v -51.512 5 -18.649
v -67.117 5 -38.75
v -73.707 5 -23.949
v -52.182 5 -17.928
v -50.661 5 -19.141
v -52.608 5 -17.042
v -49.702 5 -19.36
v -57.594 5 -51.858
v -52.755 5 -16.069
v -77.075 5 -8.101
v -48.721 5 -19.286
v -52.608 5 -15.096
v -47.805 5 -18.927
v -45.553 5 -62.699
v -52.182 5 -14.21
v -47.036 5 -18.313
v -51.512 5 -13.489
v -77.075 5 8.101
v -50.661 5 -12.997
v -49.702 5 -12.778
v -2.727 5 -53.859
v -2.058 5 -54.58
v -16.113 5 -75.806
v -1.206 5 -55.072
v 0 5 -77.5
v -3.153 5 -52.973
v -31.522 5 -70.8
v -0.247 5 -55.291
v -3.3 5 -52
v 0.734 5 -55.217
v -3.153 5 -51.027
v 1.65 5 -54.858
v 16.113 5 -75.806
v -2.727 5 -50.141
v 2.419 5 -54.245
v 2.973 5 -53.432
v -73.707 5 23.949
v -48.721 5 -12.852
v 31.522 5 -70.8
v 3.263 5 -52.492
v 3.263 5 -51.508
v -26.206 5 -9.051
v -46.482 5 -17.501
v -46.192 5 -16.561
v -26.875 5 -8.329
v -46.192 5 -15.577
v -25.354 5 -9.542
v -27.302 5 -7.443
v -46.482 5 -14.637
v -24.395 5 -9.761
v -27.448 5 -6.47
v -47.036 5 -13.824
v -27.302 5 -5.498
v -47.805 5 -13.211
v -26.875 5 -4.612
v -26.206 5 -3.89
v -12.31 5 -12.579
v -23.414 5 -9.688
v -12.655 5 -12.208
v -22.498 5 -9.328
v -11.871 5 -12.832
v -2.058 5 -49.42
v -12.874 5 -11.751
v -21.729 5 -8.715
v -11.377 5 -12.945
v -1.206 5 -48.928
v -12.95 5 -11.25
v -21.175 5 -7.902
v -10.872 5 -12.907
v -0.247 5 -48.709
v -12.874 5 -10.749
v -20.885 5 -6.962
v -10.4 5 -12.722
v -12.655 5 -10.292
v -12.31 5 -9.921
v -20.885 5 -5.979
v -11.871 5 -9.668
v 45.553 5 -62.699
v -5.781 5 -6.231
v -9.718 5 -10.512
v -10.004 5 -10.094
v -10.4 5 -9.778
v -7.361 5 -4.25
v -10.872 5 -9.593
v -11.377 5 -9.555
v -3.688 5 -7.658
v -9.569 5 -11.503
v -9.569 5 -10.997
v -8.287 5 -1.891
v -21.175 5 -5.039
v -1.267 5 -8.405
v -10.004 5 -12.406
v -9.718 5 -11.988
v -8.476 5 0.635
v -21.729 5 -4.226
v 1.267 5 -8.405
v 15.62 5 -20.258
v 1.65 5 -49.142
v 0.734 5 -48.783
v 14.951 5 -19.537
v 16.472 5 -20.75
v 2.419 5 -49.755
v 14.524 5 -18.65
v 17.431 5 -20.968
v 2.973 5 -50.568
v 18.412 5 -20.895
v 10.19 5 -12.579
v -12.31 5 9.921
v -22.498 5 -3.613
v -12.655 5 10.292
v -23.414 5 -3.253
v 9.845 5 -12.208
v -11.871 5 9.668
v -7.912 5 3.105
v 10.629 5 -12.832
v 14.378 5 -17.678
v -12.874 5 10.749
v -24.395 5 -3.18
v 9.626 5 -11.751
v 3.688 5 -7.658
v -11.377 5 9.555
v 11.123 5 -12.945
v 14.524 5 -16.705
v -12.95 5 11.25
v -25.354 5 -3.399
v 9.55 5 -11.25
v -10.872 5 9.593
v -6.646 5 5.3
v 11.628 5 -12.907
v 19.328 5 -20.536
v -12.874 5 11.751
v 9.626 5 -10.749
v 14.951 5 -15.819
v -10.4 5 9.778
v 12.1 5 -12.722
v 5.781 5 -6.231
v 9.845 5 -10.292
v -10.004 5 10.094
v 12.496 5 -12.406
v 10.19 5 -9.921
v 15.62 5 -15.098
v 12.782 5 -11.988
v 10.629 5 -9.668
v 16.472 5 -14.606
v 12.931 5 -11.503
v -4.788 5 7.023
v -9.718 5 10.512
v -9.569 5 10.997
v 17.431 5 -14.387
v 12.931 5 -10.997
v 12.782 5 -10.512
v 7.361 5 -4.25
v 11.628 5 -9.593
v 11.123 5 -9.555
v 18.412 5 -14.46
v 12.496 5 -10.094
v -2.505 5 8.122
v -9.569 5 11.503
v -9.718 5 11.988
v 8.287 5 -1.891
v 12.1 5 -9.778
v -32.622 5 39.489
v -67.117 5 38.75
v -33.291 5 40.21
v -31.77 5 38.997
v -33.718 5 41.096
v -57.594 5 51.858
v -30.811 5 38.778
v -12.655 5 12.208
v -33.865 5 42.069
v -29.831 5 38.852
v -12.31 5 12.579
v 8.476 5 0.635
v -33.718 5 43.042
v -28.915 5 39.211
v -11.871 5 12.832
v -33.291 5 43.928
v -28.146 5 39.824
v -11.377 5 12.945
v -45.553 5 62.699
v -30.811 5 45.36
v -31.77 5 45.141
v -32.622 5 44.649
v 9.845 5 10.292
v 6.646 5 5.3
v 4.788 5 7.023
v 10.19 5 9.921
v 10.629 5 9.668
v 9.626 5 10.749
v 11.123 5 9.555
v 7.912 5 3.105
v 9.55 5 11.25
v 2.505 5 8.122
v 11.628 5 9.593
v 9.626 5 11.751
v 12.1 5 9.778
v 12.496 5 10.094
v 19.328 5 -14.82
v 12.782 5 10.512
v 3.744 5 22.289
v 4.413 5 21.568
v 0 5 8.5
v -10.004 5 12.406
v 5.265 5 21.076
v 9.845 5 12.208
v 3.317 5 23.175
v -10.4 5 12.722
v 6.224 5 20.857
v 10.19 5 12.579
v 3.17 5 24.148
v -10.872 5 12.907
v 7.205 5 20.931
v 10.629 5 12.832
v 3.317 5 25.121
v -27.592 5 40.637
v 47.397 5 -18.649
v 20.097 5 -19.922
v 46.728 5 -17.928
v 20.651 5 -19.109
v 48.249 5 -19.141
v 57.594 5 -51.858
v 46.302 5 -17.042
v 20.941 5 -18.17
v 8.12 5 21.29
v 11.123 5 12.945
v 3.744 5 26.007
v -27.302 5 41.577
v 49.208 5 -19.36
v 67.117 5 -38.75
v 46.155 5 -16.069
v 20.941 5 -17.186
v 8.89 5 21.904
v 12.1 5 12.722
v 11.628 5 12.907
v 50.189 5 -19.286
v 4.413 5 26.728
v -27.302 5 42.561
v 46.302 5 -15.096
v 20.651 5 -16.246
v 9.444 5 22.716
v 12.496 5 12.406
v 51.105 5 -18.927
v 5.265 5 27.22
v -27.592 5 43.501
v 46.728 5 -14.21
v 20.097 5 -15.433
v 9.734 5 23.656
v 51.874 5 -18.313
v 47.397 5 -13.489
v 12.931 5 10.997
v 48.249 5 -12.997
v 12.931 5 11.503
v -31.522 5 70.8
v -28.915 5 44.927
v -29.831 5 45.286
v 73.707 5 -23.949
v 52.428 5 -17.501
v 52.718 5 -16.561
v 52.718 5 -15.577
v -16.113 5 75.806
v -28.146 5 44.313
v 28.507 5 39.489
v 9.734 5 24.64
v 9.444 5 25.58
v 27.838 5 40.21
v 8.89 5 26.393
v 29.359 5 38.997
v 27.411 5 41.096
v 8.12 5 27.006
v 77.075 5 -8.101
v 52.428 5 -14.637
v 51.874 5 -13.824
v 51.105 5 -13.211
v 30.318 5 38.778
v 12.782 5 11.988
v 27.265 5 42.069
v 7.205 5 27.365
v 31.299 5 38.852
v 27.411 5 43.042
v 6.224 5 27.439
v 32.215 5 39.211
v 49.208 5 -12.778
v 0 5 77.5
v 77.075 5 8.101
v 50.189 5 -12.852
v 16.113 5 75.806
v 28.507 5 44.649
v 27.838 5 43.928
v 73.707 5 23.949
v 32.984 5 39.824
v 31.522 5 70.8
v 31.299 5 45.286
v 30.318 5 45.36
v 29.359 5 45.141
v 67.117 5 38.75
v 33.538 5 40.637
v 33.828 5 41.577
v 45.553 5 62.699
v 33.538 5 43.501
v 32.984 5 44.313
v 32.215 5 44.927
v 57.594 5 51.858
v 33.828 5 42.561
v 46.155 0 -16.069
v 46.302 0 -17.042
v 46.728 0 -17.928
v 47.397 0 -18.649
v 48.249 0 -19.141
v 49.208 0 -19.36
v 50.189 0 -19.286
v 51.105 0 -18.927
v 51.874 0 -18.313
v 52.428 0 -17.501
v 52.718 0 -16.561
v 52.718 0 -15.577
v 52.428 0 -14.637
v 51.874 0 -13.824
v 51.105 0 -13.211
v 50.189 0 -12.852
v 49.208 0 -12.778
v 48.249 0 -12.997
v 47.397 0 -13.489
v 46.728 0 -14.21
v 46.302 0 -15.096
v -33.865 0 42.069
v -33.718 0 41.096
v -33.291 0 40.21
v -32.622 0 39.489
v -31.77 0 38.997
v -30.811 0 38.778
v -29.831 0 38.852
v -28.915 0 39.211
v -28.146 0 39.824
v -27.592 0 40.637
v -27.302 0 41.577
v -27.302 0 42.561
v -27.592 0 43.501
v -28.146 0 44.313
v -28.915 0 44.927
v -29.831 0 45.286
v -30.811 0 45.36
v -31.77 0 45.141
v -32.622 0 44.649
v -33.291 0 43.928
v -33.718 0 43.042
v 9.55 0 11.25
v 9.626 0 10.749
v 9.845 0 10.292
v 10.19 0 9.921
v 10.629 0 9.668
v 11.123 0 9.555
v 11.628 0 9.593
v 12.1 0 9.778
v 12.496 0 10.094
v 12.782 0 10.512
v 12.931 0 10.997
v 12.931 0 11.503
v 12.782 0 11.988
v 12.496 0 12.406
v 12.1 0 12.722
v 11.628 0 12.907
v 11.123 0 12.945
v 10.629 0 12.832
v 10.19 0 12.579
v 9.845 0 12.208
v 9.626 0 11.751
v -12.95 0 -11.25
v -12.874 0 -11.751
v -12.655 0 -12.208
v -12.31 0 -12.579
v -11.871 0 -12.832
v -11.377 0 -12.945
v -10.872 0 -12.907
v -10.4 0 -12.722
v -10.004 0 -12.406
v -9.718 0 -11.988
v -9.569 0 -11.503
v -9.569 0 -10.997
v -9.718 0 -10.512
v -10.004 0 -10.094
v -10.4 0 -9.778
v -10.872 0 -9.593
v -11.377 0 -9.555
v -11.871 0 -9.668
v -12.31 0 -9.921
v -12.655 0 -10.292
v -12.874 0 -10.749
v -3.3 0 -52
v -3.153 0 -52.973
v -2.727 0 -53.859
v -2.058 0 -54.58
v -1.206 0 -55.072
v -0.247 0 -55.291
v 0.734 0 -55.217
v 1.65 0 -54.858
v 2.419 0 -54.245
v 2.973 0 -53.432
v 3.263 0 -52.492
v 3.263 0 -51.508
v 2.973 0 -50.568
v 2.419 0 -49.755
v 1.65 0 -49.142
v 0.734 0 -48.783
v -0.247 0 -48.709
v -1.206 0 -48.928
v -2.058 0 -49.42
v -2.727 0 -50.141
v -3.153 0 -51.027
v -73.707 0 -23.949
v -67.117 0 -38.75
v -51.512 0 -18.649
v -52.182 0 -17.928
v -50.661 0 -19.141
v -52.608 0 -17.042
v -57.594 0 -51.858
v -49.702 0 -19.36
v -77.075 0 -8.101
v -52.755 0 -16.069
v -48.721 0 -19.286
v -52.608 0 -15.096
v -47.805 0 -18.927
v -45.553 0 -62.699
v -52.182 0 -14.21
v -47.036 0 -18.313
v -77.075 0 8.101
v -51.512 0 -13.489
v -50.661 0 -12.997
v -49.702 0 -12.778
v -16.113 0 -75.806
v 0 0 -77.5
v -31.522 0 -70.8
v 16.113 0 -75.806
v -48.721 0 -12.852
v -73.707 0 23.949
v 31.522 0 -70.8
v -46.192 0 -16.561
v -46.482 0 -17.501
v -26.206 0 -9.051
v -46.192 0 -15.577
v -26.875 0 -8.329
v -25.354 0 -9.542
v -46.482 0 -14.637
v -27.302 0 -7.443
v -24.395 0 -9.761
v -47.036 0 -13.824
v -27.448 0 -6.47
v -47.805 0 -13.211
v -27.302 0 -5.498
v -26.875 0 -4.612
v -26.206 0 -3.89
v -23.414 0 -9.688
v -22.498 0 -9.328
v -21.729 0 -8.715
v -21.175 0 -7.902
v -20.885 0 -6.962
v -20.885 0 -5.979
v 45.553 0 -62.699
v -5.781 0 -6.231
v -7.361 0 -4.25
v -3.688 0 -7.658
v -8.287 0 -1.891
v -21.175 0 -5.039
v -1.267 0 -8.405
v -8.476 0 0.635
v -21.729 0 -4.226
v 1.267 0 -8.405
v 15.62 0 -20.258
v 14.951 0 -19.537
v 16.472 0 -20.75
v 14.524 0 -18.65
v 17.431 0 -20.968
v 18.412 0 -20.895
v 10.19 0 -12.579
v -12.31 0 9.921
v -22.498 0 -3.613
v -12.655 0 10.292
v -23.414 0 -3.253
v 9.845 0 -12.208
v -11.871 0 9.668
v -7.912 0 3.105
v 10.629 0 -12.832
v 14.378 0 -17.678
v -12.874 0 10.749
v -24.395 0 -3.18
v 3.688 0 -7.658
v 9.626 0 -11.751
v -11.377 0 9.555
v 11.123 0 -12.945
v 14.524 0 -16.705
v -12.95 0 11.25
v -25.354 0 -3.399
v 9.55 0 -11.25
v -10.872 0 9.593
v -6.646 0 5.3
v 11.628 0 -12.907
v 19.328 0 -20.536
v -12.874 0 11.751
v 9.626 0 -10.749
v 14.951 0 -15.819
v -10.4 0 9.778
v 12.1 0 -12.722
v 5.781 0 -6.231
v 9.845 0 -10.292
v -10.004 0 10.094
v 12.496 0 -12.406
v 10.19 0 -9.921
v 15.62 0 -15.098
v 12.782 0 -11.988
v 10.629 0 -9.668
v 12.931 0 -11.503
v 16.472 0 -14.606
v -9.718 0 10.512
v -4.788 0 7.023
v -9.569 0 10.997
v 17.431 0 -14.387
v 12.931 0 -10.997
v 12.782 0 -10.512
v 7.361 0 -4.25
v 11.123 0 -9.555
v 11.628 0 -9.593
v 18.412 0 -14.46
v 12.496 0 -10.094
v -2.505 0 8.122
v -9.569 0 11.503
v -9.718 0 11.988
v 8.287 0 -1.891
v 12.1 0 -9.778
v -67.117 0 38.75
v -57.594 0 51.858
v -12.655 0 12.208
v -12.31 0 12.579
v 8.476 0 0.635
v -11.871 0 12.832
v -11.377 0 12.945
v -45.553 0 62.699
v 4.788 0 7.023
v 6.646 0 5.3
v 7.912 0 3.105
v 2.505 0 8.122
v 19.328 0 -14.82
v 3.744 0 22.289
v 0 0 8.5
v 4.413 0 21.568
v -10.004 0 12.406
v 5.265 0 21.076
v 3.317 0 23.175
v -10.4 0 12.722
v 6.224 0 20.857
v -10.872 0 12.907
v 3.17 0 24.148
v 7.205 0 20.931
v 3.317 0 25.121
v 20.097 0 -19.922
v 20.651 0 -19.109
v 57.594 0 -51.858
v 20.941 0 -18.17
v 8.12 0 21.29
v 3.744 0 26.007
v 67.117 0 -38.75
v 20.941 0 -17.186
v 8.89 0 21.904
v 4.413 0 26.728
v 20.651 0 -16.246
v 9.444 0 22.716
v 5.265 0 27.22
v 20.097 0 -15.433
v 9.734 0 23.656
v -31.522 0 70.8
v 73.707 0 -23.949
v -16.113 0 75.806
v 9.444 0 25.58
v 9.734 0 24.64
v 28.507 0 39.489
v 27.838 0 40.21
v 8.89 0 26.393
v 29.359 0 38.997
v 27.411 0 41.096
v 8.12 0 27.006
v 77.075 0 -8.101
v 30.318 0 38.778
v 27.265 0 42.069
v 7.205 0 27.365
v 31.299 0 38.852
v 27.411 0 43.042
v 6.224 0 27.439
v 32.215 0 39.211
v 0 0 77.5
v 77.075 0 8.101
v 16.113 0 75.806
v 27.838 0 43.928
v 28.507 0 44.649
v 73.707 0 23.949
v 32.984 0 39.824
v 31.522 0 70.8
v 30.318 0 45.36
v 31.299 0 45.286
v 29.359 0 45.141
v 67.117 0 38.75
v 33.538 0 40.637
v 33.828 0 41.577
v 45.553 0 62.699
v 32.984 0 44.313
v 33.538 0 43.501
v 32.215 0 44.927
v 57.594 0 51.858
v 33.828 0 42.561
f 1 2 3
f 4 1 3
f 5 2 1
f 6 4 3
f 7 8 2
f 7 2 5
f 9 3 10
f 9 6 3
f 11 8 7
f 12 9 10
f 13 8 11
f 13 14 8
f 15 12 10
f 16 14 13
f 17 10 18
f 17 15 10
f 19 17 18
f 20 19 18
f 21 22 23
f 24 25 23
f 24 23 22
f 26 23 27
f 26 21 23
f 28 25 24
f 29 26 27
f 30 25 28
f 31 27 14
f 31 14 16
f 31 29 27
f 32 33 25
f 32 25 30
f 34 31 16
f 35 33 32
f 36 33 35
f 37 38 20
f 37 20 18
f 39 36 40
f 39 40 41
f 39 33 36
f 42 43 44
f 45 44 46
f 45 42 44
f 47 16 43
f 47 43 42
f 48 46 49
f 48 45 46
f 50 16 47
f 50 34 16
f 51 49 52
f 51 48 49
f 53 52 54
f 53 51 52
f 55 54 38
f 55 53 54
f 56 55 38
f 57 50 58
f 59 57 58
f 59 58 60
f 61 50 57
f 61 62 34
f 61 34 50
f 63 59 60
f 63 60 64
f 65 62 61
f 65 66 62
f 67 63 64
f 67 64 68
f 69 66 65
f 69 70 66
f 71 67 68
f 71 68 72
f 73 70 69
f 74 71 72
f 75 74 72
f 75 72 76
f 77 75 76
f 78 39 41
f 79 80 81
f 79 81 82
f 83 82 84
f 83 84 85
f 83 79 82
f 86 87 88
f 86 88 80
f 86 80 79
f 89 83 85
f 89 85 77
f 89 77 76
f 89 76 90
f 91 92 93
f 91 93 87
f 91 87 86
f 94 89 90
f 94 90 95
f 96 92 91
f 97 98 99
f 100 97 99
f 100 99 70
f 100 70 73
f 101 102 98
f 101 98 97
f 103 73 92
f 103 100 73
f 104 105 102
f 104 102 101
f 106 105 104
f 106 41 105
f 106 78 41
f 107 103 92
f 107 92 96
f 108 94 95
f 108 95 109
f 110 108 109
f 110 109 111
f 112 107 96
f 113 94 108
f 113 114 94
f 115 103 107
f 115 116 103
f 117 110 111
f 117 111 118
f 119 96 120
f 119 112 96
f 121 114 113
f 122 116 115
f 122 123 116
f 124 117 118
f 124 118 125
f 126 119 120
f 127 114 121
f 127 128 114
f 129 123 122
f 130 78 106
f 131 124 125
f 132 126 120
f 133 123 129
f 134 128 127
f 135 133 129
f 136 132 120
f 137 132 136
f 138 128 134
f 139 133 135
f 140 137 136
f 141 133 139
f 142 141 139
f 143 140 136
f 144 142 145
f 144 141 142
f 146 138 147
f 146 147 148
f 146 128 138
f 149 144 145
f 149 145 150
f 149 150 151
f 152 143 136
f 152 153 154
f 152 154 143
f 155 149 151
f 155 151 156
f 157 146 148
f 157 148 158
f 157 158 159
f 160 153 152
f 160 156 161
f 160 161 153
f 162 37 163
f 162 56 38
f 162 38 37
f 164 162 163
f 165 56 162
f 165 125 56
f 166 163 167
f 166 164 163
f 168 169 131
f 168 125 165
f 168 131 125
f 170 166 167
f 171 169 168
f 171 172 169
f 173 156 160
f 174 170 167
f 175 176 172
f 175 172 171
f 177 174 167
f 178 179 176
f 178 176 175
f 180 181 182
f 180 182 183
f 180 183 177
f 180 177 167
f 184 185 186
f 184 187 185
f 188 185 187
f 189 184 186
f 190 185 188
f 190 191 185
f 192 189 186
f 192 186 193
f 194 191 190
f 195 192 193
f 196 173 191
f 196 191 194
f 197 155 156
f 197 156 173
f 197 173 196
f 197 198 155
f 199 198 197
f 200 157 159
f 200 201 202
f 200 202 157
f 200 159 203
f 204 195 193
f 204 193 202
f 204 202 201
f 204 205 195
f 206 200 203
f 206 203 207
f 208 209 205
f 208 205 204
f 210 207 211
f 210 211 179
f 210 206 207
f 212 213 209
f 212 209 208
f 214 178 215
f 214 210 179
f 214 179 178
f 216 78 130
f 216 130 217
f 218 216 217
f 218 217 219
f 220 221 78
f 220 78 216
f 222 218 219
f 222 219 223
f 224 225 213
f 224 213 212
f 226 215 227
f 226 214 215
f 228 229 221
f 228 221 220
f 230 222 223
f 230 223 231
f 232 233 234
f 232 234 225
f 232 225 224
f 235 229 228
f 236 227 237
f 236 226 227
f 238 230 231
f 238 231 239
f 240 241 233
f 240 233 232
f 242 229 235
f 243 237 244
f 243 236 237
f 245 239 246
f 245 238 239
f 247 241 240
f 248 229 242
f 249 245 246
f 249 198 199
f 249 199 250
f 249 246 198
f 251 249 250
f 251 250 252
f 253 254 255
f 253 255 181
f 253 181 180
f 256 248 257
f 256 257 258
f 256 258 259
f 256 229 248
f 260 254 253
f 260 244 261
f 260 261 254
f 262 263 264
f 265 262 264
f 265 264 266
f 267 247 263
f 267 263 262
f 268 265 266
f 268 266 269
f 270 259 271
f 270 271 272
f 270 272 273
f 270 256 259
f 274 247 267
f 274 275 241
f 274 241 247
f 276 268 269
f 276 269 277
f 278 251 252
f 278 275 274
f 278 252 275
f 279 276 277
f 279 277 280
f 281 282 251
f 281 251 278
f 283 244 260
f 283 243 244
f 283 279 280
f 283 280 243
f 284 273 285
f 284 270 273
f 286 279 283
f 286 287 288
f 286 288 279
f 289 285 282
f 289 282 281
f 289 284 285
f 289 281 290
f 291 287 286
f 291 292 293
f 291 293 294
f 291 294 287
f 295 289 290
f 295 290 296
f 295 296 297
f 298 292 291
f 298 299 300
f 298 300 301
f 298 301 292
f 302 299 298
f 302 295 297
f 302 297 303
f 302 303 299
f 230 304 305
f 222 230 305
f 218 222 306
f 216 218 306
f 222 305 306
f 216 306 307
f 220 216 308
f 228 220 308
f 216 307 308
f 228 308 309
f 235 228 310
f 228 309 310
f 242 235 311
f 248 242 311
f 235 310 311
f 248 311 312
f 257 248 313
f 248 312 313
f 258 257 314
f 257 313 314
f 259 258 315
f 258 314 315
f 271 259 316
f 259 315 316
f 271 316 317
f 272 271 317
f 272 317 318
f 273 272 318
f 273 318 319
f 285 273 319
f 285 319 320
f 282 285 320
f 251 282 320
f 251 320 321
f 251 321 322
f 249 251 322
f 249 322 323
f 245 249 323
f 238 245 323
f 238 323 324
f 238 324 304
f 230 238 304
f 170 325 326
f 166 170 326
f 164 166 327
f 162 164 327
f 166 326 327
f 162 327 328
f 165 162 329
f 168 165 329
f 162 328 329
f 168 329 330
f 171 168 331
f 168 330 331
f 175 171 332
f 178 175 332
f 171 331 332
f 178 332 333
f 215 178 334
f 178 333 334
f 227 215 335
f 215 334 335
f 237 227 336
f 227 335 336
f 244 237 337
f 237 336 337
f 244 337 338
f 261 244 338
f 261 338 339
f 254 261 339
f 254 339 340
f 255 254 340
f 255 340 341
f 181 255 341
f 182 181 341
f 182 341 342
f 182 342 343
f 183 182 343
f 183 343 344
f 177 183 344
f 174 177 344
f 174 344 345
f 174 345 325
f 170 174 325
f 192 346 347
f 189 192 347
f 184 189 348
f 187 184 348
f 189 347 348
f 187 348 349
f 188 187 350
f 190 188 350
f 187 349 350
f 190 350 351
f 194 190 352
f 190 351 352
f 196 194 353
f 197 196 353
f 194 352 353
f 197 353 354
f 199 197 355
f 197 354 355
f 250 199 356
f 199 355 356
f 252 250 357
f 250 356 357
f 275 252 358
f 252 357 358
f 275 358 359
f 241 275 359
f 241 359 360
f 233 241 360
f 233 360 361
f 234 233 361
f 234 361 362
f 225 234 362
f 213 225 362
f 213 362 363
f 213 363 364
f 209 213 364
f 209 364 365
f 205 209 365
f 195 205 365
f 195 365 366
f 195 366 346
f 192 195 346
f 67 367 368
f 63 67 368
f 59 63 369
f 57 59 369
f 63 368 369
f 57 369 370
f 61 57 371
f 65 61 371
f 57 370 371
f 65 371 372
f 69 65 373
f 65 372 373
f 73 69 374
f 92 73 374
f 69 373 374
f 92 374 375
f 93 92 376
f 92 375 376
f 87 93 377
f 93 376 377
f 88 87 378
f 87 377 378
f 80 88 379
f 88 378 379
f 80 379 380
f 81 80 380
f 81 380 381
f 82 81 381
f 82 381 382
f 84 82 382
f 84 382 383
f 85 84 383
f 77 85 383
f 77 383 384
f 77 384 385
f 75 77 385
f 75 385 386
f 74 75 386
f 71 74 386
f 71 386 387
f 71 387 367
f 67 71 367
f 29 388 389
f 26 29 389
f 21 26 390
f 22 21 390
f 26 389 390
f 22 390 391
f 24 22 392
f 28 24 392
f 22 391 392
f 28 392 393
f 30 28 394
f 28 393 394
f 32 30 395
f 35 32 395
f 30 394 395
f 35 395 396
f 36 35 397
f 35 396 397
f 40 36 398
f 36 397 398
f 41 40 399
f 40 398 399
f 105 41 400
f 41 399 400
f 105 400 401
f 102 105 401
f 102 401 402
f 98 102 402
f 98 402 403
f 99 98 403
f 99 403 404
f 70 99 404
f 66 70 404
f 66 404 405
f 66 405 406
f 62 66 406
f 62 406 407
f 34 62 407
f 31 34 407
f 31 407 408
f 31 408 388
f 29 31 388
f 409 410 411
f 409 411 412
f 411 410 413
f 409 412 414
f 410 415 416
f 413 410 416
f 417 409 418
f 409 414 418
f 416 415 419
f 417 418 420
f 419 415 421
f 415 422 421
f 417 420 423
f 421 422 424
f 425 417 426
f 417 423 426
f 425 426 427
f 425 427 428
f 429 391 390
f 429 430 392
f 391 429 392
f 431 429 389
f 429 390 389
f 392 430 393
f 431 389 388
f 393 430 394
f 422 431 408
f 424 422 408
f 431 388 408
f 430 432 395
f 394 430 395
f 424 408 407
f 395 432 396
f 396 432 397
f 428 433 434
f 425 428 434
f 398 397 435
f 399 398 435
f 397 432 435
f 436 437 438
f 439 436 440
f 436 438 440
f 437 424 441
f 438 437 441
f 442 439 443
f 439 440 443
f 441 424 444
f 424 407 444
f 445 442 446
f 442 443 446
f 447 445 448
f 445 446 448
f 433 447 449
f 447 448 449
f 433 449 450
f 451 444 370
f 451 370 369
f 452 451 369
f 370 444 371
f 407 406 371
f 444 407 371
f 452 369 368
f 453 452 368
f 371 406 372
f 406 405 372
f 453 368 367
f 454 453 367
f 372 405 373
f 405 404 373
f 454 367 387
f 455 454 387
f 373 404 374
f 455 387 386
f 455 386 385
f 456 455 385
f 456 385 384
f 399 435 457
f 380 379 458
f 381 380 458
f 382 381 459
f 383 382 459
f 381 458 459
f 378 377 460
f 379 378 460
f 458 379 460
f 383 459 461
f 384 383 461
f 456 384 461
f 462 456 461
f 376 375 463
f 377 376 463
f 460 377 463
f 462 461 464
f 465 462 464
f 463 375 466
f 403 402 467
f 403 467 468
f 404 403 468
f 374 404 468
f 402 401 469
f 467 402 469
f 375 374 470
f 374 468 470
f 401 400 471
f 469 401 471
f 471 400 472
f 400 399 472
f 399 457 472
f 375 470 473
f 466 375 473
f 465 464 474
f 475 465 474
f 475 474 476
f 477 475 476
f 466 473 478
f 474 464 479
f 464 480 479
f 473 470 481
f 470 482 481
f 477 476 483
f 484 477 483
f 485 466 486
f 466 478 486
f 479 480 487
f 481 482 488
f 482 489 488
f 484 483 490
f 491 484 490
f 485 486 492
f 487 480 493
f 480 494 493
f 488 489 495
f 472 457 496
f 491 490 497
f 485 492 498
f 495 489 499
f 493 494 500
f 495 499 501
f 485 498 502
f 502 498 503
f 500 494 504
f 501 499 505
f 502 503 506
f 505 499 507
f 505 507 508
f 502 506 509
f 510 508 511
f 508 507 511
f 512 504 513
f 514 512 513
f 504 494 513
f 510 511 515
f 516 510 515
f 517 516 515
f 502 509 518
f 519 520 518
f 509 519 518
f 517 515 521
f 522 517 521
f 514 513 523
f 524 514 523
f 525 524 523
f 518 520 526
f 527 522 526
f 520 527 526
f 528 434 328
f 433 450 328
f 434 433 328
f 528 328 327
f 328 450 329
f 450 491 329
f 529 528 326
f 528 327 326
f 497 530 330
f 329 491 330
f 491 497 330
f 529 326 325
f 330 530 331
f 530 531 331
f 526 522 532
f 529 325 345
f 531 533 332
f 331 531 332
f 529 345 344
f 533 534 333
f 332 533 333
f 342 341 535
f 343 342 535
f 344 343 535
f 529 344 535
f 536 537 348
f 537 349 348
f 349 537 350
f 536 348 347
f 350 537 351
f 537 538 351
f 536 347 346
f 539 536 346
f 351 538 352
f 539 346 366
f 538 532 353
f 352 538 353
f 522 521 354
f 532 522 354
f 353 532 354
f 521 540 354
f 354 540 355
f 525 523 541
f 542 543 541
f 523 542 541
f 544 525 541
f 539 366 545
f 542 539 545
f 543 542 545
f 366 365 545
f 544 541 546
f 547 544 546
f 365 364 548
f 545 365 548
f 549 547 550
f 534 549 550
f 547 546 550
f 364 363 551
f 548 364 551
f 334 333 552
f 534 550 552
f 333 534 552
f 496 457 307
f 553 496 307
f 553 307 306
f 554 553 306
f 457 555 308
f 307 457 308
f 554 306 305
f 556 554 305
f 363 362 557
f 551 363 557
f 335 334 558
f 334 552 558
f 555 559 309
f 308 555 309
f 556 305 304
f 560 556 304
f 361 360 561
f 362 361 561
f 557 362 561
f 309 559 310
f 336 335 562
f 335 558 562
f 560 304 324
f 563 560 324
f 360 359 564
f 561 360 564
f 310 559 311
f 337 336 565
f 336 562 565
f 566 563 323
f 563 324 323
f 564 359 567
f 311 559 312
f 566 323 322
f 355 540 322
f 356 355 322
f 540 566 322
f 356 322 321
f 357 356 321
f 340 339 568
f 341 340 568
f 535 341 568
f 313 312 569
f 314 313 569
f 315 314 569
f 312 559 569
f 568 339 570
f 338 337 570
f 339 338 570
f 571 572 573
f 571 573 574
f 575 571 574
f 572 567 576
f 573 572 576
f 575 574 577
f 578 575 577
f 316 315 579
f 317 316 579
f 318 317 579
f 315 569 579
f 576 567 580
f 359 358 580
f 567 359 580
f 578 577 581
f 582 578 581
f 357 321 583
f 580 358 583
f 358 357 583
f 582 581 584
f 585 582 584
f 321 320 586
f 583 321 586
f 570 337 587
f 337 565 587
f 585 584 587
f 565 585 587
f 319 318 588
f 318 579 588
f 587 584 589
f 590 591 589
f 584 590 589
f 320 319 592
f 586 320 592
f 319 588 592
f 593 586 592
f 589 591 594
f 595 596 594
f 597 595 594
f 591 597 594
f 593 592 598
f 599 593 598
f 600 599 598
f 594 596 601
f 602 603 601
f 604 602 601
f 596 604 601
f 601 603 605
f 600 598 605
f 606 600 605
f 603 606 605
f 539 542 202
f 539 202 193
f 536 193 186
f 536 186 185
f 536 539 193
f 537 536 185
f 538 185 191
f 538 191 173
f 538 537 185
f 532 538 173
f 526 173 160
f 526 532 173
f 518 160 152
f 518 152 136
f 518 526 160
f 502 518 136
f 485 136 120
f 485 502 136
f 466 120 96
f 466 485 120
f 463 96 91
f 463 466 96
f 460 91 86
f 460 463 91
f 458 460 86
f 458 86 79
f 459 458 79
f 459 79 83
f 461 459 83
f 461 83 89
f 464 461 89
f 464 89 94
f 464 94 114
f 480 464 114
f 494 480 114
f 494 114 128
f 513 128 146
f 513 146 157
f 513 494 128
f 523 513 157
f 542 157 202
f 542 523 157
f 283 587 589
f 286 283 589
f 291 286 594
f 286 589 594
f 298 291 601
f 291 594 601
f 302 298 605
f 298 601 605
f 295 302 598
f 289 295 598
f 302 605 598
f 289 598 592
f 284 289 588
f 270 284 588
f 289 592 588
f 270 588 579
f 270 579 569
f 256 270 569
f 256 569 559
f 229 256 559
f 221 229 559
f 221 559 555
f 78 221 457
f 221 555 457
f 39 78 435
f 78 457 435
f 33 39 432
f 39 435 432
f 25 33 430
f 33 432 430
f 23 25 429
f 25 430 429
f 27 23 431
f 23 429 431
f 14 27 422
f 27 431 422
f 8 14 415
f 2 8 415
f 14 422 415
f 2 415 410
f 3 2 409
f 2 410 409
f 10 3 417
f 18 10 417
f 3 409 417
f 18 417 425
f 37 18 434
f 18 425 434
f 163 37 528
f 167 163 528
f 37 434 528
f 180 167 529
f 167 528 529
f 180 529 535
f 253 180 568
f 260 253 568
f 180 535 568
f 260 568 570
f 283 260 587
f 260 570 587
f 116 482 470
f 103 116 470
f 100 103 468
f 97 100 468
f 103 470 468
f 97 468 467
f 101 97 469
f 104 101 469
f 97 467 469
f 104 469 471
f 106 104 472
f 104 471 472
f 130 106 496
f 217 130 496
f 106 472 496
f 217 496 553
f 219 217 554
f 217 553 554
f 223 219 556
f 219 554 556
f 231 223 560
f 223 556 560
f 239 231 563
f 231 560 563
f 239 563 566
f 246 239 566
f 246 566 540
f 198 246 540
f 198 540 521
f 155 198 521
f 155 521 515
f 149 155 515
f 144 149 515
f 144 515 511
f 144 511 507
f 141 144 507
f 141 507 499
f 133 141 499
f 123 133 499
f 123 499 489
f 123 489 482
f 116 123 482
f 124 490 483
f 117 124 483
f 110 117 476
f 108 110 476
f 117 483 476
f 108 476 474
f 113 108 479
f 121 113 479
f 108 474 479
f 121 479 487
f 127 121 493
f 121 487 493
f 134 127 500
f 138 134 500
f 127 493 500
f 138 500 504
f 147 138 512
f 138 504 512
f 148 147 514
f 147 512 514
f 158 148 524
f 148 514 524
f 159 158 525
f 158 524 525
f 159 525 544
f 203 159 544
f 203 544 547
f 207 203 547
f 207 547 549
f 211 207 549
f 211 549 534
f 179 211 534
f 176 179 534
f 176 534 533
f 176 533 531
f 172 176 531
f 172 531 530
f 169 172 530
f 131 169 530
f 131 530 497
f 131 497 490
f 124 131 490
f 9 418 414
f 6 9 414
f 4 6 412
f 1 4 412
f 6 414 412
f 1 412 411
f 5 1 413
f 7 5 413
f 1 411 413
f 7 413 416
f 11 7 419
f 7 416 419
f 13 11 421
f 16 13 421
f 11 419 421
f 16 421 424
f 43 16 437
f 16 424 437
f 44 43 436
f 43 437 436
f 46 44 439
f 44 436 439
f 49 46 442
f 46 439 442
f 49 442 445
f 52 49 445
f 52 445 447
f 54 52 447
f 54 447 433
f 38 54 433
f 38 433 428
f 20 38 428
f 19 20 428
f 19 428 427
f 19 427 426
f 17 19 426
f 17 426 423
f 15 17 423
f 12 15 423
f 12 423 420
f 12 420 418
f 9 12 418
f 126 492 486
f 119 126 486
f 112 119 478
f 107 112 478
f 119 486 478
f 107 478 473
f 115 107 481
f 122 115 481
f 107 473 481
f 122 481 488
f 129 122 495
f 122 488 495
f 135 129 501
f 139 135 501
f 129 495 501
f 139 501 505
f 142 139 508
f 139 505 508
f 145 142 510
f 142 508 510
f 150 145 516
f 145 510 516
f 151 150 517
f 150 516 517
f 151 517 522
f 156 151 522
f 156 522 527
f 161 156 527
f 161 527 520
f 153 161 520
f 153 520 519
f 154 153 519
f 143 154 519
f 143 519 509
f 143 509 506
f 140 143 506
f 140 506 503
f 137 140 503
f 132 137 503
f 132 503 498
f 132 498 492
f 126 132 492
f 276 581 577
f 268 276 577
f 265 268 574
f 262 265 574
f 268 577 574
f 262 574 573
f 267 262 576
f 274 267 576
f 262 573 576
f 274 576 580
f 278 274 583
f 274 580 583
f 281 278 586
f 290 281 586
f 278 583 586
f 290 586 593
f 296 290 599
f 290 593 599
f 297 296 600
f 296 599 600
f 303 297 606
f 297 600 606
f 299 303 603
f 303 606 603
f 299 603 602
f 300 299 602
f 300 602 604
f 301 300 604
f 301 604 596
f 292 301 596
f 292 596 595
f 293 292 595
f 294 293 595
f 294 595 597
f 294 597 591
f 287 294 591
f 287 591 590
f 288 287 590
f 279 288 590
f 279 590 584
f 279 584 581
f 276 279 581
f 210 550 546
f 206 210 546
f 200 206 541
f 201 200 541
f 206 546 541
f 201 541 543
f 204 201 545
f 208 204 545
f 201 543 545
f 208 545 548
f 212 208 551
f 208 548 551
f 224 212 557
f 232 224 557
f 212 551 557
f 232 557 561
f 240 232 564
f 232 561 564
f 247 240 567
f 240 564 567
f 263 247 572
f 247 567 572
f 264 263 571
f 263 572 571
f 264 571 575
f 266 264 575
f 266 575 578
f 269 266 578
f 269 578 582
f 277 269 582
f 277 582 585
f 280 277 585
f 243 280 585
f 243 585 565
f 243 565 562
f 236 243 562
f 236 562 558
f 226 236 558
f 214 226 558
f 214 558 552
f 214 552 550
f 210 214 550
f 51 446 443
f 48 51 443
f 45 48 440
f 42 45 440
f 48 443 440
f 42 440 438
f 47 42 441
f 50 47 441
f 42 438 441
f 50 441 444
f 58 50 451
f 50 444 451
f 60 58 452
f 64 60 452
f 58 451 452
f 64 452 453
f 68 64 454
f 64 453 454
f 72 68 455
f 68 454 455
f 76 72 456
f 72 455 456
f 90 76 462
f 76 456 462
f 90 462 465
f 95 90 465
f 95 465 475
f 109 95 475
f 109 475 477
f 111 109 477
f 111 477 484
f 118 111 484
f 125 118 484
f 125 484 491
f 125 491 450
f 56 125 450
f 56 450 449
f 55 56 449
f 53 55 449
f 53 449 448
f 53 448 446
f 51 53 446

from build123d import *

# Parameters (mm, degrees)
SKETCH1_R            = 77.5
SKETCH1_R_2          = 8.5
BODY_DEPTH           = 5
M6_CLEARANCE_HOLE1_D = 6.6
M3_CLEARANCE_HOLE1_D = 3.4
M6_CLEARANCE_HOLE2_D = 6.6


with BuildPart() as part:
    # Sketch1 → Body (new body)
    with BuildSketch(Plane(origin=(0, 0, 0), x_dir=(1, 0, 0), z_dir=(0, 1, 0))):
        with Locations(Location((0, 0, 0), (0, 0, 270))):
            Circle(SKETCH1_R)
        with Locations(Location((0, 0, 0), (0, 0, 270))):
            Circle(SKETCH1_R_2, mode=Mode.SUBTRACT)
    extrude(amount=BODY_DEPTH)

    # M6 Clearance Hole1 (through all)
    with Locations(Plane(origin=(0, 5, 0), x_dir=(1, 0, 0), z_dir=(0, 1, 0))):
        with Locations((0, 52), (49.454938847, 16.068883707), (30.564833119, -42.068883707), (-30.564833119, -42.068883707), (-49.454938847, 16.068883707), (0, 0)):
            Hole(M6_CLEARANCE_HOLE1_D / 2)

    # M3 Clearance Hole1 (through all)
    with Locations(Plane(origin=(0, 5, 0), x_dir=(1, 0, 0), z_dir=(0, 1, 0))):
        with Locations((0, 0), (-11.25, 11.25), (11.25, -11.25), (11.25, 11.25), (-11.25, -11.25)):
            Hole(M3_CLEARANCE_HOLE1_D / 2)

    # M6 Clearance Hole2 (through all)
    with Locations(Plane(origin=(0, 5, 0), x_dir=(1, 0, 0), z_dir=(0, 1, 0))):
        with Locations((17.67766953, 17.67766953), (6.470476128, -24.148145657), (-24.148145657, 6.470476128), (0, 0)):
            Hole(M6_CLEARANCE_HOLE2_D / 2)


solid = part.part
